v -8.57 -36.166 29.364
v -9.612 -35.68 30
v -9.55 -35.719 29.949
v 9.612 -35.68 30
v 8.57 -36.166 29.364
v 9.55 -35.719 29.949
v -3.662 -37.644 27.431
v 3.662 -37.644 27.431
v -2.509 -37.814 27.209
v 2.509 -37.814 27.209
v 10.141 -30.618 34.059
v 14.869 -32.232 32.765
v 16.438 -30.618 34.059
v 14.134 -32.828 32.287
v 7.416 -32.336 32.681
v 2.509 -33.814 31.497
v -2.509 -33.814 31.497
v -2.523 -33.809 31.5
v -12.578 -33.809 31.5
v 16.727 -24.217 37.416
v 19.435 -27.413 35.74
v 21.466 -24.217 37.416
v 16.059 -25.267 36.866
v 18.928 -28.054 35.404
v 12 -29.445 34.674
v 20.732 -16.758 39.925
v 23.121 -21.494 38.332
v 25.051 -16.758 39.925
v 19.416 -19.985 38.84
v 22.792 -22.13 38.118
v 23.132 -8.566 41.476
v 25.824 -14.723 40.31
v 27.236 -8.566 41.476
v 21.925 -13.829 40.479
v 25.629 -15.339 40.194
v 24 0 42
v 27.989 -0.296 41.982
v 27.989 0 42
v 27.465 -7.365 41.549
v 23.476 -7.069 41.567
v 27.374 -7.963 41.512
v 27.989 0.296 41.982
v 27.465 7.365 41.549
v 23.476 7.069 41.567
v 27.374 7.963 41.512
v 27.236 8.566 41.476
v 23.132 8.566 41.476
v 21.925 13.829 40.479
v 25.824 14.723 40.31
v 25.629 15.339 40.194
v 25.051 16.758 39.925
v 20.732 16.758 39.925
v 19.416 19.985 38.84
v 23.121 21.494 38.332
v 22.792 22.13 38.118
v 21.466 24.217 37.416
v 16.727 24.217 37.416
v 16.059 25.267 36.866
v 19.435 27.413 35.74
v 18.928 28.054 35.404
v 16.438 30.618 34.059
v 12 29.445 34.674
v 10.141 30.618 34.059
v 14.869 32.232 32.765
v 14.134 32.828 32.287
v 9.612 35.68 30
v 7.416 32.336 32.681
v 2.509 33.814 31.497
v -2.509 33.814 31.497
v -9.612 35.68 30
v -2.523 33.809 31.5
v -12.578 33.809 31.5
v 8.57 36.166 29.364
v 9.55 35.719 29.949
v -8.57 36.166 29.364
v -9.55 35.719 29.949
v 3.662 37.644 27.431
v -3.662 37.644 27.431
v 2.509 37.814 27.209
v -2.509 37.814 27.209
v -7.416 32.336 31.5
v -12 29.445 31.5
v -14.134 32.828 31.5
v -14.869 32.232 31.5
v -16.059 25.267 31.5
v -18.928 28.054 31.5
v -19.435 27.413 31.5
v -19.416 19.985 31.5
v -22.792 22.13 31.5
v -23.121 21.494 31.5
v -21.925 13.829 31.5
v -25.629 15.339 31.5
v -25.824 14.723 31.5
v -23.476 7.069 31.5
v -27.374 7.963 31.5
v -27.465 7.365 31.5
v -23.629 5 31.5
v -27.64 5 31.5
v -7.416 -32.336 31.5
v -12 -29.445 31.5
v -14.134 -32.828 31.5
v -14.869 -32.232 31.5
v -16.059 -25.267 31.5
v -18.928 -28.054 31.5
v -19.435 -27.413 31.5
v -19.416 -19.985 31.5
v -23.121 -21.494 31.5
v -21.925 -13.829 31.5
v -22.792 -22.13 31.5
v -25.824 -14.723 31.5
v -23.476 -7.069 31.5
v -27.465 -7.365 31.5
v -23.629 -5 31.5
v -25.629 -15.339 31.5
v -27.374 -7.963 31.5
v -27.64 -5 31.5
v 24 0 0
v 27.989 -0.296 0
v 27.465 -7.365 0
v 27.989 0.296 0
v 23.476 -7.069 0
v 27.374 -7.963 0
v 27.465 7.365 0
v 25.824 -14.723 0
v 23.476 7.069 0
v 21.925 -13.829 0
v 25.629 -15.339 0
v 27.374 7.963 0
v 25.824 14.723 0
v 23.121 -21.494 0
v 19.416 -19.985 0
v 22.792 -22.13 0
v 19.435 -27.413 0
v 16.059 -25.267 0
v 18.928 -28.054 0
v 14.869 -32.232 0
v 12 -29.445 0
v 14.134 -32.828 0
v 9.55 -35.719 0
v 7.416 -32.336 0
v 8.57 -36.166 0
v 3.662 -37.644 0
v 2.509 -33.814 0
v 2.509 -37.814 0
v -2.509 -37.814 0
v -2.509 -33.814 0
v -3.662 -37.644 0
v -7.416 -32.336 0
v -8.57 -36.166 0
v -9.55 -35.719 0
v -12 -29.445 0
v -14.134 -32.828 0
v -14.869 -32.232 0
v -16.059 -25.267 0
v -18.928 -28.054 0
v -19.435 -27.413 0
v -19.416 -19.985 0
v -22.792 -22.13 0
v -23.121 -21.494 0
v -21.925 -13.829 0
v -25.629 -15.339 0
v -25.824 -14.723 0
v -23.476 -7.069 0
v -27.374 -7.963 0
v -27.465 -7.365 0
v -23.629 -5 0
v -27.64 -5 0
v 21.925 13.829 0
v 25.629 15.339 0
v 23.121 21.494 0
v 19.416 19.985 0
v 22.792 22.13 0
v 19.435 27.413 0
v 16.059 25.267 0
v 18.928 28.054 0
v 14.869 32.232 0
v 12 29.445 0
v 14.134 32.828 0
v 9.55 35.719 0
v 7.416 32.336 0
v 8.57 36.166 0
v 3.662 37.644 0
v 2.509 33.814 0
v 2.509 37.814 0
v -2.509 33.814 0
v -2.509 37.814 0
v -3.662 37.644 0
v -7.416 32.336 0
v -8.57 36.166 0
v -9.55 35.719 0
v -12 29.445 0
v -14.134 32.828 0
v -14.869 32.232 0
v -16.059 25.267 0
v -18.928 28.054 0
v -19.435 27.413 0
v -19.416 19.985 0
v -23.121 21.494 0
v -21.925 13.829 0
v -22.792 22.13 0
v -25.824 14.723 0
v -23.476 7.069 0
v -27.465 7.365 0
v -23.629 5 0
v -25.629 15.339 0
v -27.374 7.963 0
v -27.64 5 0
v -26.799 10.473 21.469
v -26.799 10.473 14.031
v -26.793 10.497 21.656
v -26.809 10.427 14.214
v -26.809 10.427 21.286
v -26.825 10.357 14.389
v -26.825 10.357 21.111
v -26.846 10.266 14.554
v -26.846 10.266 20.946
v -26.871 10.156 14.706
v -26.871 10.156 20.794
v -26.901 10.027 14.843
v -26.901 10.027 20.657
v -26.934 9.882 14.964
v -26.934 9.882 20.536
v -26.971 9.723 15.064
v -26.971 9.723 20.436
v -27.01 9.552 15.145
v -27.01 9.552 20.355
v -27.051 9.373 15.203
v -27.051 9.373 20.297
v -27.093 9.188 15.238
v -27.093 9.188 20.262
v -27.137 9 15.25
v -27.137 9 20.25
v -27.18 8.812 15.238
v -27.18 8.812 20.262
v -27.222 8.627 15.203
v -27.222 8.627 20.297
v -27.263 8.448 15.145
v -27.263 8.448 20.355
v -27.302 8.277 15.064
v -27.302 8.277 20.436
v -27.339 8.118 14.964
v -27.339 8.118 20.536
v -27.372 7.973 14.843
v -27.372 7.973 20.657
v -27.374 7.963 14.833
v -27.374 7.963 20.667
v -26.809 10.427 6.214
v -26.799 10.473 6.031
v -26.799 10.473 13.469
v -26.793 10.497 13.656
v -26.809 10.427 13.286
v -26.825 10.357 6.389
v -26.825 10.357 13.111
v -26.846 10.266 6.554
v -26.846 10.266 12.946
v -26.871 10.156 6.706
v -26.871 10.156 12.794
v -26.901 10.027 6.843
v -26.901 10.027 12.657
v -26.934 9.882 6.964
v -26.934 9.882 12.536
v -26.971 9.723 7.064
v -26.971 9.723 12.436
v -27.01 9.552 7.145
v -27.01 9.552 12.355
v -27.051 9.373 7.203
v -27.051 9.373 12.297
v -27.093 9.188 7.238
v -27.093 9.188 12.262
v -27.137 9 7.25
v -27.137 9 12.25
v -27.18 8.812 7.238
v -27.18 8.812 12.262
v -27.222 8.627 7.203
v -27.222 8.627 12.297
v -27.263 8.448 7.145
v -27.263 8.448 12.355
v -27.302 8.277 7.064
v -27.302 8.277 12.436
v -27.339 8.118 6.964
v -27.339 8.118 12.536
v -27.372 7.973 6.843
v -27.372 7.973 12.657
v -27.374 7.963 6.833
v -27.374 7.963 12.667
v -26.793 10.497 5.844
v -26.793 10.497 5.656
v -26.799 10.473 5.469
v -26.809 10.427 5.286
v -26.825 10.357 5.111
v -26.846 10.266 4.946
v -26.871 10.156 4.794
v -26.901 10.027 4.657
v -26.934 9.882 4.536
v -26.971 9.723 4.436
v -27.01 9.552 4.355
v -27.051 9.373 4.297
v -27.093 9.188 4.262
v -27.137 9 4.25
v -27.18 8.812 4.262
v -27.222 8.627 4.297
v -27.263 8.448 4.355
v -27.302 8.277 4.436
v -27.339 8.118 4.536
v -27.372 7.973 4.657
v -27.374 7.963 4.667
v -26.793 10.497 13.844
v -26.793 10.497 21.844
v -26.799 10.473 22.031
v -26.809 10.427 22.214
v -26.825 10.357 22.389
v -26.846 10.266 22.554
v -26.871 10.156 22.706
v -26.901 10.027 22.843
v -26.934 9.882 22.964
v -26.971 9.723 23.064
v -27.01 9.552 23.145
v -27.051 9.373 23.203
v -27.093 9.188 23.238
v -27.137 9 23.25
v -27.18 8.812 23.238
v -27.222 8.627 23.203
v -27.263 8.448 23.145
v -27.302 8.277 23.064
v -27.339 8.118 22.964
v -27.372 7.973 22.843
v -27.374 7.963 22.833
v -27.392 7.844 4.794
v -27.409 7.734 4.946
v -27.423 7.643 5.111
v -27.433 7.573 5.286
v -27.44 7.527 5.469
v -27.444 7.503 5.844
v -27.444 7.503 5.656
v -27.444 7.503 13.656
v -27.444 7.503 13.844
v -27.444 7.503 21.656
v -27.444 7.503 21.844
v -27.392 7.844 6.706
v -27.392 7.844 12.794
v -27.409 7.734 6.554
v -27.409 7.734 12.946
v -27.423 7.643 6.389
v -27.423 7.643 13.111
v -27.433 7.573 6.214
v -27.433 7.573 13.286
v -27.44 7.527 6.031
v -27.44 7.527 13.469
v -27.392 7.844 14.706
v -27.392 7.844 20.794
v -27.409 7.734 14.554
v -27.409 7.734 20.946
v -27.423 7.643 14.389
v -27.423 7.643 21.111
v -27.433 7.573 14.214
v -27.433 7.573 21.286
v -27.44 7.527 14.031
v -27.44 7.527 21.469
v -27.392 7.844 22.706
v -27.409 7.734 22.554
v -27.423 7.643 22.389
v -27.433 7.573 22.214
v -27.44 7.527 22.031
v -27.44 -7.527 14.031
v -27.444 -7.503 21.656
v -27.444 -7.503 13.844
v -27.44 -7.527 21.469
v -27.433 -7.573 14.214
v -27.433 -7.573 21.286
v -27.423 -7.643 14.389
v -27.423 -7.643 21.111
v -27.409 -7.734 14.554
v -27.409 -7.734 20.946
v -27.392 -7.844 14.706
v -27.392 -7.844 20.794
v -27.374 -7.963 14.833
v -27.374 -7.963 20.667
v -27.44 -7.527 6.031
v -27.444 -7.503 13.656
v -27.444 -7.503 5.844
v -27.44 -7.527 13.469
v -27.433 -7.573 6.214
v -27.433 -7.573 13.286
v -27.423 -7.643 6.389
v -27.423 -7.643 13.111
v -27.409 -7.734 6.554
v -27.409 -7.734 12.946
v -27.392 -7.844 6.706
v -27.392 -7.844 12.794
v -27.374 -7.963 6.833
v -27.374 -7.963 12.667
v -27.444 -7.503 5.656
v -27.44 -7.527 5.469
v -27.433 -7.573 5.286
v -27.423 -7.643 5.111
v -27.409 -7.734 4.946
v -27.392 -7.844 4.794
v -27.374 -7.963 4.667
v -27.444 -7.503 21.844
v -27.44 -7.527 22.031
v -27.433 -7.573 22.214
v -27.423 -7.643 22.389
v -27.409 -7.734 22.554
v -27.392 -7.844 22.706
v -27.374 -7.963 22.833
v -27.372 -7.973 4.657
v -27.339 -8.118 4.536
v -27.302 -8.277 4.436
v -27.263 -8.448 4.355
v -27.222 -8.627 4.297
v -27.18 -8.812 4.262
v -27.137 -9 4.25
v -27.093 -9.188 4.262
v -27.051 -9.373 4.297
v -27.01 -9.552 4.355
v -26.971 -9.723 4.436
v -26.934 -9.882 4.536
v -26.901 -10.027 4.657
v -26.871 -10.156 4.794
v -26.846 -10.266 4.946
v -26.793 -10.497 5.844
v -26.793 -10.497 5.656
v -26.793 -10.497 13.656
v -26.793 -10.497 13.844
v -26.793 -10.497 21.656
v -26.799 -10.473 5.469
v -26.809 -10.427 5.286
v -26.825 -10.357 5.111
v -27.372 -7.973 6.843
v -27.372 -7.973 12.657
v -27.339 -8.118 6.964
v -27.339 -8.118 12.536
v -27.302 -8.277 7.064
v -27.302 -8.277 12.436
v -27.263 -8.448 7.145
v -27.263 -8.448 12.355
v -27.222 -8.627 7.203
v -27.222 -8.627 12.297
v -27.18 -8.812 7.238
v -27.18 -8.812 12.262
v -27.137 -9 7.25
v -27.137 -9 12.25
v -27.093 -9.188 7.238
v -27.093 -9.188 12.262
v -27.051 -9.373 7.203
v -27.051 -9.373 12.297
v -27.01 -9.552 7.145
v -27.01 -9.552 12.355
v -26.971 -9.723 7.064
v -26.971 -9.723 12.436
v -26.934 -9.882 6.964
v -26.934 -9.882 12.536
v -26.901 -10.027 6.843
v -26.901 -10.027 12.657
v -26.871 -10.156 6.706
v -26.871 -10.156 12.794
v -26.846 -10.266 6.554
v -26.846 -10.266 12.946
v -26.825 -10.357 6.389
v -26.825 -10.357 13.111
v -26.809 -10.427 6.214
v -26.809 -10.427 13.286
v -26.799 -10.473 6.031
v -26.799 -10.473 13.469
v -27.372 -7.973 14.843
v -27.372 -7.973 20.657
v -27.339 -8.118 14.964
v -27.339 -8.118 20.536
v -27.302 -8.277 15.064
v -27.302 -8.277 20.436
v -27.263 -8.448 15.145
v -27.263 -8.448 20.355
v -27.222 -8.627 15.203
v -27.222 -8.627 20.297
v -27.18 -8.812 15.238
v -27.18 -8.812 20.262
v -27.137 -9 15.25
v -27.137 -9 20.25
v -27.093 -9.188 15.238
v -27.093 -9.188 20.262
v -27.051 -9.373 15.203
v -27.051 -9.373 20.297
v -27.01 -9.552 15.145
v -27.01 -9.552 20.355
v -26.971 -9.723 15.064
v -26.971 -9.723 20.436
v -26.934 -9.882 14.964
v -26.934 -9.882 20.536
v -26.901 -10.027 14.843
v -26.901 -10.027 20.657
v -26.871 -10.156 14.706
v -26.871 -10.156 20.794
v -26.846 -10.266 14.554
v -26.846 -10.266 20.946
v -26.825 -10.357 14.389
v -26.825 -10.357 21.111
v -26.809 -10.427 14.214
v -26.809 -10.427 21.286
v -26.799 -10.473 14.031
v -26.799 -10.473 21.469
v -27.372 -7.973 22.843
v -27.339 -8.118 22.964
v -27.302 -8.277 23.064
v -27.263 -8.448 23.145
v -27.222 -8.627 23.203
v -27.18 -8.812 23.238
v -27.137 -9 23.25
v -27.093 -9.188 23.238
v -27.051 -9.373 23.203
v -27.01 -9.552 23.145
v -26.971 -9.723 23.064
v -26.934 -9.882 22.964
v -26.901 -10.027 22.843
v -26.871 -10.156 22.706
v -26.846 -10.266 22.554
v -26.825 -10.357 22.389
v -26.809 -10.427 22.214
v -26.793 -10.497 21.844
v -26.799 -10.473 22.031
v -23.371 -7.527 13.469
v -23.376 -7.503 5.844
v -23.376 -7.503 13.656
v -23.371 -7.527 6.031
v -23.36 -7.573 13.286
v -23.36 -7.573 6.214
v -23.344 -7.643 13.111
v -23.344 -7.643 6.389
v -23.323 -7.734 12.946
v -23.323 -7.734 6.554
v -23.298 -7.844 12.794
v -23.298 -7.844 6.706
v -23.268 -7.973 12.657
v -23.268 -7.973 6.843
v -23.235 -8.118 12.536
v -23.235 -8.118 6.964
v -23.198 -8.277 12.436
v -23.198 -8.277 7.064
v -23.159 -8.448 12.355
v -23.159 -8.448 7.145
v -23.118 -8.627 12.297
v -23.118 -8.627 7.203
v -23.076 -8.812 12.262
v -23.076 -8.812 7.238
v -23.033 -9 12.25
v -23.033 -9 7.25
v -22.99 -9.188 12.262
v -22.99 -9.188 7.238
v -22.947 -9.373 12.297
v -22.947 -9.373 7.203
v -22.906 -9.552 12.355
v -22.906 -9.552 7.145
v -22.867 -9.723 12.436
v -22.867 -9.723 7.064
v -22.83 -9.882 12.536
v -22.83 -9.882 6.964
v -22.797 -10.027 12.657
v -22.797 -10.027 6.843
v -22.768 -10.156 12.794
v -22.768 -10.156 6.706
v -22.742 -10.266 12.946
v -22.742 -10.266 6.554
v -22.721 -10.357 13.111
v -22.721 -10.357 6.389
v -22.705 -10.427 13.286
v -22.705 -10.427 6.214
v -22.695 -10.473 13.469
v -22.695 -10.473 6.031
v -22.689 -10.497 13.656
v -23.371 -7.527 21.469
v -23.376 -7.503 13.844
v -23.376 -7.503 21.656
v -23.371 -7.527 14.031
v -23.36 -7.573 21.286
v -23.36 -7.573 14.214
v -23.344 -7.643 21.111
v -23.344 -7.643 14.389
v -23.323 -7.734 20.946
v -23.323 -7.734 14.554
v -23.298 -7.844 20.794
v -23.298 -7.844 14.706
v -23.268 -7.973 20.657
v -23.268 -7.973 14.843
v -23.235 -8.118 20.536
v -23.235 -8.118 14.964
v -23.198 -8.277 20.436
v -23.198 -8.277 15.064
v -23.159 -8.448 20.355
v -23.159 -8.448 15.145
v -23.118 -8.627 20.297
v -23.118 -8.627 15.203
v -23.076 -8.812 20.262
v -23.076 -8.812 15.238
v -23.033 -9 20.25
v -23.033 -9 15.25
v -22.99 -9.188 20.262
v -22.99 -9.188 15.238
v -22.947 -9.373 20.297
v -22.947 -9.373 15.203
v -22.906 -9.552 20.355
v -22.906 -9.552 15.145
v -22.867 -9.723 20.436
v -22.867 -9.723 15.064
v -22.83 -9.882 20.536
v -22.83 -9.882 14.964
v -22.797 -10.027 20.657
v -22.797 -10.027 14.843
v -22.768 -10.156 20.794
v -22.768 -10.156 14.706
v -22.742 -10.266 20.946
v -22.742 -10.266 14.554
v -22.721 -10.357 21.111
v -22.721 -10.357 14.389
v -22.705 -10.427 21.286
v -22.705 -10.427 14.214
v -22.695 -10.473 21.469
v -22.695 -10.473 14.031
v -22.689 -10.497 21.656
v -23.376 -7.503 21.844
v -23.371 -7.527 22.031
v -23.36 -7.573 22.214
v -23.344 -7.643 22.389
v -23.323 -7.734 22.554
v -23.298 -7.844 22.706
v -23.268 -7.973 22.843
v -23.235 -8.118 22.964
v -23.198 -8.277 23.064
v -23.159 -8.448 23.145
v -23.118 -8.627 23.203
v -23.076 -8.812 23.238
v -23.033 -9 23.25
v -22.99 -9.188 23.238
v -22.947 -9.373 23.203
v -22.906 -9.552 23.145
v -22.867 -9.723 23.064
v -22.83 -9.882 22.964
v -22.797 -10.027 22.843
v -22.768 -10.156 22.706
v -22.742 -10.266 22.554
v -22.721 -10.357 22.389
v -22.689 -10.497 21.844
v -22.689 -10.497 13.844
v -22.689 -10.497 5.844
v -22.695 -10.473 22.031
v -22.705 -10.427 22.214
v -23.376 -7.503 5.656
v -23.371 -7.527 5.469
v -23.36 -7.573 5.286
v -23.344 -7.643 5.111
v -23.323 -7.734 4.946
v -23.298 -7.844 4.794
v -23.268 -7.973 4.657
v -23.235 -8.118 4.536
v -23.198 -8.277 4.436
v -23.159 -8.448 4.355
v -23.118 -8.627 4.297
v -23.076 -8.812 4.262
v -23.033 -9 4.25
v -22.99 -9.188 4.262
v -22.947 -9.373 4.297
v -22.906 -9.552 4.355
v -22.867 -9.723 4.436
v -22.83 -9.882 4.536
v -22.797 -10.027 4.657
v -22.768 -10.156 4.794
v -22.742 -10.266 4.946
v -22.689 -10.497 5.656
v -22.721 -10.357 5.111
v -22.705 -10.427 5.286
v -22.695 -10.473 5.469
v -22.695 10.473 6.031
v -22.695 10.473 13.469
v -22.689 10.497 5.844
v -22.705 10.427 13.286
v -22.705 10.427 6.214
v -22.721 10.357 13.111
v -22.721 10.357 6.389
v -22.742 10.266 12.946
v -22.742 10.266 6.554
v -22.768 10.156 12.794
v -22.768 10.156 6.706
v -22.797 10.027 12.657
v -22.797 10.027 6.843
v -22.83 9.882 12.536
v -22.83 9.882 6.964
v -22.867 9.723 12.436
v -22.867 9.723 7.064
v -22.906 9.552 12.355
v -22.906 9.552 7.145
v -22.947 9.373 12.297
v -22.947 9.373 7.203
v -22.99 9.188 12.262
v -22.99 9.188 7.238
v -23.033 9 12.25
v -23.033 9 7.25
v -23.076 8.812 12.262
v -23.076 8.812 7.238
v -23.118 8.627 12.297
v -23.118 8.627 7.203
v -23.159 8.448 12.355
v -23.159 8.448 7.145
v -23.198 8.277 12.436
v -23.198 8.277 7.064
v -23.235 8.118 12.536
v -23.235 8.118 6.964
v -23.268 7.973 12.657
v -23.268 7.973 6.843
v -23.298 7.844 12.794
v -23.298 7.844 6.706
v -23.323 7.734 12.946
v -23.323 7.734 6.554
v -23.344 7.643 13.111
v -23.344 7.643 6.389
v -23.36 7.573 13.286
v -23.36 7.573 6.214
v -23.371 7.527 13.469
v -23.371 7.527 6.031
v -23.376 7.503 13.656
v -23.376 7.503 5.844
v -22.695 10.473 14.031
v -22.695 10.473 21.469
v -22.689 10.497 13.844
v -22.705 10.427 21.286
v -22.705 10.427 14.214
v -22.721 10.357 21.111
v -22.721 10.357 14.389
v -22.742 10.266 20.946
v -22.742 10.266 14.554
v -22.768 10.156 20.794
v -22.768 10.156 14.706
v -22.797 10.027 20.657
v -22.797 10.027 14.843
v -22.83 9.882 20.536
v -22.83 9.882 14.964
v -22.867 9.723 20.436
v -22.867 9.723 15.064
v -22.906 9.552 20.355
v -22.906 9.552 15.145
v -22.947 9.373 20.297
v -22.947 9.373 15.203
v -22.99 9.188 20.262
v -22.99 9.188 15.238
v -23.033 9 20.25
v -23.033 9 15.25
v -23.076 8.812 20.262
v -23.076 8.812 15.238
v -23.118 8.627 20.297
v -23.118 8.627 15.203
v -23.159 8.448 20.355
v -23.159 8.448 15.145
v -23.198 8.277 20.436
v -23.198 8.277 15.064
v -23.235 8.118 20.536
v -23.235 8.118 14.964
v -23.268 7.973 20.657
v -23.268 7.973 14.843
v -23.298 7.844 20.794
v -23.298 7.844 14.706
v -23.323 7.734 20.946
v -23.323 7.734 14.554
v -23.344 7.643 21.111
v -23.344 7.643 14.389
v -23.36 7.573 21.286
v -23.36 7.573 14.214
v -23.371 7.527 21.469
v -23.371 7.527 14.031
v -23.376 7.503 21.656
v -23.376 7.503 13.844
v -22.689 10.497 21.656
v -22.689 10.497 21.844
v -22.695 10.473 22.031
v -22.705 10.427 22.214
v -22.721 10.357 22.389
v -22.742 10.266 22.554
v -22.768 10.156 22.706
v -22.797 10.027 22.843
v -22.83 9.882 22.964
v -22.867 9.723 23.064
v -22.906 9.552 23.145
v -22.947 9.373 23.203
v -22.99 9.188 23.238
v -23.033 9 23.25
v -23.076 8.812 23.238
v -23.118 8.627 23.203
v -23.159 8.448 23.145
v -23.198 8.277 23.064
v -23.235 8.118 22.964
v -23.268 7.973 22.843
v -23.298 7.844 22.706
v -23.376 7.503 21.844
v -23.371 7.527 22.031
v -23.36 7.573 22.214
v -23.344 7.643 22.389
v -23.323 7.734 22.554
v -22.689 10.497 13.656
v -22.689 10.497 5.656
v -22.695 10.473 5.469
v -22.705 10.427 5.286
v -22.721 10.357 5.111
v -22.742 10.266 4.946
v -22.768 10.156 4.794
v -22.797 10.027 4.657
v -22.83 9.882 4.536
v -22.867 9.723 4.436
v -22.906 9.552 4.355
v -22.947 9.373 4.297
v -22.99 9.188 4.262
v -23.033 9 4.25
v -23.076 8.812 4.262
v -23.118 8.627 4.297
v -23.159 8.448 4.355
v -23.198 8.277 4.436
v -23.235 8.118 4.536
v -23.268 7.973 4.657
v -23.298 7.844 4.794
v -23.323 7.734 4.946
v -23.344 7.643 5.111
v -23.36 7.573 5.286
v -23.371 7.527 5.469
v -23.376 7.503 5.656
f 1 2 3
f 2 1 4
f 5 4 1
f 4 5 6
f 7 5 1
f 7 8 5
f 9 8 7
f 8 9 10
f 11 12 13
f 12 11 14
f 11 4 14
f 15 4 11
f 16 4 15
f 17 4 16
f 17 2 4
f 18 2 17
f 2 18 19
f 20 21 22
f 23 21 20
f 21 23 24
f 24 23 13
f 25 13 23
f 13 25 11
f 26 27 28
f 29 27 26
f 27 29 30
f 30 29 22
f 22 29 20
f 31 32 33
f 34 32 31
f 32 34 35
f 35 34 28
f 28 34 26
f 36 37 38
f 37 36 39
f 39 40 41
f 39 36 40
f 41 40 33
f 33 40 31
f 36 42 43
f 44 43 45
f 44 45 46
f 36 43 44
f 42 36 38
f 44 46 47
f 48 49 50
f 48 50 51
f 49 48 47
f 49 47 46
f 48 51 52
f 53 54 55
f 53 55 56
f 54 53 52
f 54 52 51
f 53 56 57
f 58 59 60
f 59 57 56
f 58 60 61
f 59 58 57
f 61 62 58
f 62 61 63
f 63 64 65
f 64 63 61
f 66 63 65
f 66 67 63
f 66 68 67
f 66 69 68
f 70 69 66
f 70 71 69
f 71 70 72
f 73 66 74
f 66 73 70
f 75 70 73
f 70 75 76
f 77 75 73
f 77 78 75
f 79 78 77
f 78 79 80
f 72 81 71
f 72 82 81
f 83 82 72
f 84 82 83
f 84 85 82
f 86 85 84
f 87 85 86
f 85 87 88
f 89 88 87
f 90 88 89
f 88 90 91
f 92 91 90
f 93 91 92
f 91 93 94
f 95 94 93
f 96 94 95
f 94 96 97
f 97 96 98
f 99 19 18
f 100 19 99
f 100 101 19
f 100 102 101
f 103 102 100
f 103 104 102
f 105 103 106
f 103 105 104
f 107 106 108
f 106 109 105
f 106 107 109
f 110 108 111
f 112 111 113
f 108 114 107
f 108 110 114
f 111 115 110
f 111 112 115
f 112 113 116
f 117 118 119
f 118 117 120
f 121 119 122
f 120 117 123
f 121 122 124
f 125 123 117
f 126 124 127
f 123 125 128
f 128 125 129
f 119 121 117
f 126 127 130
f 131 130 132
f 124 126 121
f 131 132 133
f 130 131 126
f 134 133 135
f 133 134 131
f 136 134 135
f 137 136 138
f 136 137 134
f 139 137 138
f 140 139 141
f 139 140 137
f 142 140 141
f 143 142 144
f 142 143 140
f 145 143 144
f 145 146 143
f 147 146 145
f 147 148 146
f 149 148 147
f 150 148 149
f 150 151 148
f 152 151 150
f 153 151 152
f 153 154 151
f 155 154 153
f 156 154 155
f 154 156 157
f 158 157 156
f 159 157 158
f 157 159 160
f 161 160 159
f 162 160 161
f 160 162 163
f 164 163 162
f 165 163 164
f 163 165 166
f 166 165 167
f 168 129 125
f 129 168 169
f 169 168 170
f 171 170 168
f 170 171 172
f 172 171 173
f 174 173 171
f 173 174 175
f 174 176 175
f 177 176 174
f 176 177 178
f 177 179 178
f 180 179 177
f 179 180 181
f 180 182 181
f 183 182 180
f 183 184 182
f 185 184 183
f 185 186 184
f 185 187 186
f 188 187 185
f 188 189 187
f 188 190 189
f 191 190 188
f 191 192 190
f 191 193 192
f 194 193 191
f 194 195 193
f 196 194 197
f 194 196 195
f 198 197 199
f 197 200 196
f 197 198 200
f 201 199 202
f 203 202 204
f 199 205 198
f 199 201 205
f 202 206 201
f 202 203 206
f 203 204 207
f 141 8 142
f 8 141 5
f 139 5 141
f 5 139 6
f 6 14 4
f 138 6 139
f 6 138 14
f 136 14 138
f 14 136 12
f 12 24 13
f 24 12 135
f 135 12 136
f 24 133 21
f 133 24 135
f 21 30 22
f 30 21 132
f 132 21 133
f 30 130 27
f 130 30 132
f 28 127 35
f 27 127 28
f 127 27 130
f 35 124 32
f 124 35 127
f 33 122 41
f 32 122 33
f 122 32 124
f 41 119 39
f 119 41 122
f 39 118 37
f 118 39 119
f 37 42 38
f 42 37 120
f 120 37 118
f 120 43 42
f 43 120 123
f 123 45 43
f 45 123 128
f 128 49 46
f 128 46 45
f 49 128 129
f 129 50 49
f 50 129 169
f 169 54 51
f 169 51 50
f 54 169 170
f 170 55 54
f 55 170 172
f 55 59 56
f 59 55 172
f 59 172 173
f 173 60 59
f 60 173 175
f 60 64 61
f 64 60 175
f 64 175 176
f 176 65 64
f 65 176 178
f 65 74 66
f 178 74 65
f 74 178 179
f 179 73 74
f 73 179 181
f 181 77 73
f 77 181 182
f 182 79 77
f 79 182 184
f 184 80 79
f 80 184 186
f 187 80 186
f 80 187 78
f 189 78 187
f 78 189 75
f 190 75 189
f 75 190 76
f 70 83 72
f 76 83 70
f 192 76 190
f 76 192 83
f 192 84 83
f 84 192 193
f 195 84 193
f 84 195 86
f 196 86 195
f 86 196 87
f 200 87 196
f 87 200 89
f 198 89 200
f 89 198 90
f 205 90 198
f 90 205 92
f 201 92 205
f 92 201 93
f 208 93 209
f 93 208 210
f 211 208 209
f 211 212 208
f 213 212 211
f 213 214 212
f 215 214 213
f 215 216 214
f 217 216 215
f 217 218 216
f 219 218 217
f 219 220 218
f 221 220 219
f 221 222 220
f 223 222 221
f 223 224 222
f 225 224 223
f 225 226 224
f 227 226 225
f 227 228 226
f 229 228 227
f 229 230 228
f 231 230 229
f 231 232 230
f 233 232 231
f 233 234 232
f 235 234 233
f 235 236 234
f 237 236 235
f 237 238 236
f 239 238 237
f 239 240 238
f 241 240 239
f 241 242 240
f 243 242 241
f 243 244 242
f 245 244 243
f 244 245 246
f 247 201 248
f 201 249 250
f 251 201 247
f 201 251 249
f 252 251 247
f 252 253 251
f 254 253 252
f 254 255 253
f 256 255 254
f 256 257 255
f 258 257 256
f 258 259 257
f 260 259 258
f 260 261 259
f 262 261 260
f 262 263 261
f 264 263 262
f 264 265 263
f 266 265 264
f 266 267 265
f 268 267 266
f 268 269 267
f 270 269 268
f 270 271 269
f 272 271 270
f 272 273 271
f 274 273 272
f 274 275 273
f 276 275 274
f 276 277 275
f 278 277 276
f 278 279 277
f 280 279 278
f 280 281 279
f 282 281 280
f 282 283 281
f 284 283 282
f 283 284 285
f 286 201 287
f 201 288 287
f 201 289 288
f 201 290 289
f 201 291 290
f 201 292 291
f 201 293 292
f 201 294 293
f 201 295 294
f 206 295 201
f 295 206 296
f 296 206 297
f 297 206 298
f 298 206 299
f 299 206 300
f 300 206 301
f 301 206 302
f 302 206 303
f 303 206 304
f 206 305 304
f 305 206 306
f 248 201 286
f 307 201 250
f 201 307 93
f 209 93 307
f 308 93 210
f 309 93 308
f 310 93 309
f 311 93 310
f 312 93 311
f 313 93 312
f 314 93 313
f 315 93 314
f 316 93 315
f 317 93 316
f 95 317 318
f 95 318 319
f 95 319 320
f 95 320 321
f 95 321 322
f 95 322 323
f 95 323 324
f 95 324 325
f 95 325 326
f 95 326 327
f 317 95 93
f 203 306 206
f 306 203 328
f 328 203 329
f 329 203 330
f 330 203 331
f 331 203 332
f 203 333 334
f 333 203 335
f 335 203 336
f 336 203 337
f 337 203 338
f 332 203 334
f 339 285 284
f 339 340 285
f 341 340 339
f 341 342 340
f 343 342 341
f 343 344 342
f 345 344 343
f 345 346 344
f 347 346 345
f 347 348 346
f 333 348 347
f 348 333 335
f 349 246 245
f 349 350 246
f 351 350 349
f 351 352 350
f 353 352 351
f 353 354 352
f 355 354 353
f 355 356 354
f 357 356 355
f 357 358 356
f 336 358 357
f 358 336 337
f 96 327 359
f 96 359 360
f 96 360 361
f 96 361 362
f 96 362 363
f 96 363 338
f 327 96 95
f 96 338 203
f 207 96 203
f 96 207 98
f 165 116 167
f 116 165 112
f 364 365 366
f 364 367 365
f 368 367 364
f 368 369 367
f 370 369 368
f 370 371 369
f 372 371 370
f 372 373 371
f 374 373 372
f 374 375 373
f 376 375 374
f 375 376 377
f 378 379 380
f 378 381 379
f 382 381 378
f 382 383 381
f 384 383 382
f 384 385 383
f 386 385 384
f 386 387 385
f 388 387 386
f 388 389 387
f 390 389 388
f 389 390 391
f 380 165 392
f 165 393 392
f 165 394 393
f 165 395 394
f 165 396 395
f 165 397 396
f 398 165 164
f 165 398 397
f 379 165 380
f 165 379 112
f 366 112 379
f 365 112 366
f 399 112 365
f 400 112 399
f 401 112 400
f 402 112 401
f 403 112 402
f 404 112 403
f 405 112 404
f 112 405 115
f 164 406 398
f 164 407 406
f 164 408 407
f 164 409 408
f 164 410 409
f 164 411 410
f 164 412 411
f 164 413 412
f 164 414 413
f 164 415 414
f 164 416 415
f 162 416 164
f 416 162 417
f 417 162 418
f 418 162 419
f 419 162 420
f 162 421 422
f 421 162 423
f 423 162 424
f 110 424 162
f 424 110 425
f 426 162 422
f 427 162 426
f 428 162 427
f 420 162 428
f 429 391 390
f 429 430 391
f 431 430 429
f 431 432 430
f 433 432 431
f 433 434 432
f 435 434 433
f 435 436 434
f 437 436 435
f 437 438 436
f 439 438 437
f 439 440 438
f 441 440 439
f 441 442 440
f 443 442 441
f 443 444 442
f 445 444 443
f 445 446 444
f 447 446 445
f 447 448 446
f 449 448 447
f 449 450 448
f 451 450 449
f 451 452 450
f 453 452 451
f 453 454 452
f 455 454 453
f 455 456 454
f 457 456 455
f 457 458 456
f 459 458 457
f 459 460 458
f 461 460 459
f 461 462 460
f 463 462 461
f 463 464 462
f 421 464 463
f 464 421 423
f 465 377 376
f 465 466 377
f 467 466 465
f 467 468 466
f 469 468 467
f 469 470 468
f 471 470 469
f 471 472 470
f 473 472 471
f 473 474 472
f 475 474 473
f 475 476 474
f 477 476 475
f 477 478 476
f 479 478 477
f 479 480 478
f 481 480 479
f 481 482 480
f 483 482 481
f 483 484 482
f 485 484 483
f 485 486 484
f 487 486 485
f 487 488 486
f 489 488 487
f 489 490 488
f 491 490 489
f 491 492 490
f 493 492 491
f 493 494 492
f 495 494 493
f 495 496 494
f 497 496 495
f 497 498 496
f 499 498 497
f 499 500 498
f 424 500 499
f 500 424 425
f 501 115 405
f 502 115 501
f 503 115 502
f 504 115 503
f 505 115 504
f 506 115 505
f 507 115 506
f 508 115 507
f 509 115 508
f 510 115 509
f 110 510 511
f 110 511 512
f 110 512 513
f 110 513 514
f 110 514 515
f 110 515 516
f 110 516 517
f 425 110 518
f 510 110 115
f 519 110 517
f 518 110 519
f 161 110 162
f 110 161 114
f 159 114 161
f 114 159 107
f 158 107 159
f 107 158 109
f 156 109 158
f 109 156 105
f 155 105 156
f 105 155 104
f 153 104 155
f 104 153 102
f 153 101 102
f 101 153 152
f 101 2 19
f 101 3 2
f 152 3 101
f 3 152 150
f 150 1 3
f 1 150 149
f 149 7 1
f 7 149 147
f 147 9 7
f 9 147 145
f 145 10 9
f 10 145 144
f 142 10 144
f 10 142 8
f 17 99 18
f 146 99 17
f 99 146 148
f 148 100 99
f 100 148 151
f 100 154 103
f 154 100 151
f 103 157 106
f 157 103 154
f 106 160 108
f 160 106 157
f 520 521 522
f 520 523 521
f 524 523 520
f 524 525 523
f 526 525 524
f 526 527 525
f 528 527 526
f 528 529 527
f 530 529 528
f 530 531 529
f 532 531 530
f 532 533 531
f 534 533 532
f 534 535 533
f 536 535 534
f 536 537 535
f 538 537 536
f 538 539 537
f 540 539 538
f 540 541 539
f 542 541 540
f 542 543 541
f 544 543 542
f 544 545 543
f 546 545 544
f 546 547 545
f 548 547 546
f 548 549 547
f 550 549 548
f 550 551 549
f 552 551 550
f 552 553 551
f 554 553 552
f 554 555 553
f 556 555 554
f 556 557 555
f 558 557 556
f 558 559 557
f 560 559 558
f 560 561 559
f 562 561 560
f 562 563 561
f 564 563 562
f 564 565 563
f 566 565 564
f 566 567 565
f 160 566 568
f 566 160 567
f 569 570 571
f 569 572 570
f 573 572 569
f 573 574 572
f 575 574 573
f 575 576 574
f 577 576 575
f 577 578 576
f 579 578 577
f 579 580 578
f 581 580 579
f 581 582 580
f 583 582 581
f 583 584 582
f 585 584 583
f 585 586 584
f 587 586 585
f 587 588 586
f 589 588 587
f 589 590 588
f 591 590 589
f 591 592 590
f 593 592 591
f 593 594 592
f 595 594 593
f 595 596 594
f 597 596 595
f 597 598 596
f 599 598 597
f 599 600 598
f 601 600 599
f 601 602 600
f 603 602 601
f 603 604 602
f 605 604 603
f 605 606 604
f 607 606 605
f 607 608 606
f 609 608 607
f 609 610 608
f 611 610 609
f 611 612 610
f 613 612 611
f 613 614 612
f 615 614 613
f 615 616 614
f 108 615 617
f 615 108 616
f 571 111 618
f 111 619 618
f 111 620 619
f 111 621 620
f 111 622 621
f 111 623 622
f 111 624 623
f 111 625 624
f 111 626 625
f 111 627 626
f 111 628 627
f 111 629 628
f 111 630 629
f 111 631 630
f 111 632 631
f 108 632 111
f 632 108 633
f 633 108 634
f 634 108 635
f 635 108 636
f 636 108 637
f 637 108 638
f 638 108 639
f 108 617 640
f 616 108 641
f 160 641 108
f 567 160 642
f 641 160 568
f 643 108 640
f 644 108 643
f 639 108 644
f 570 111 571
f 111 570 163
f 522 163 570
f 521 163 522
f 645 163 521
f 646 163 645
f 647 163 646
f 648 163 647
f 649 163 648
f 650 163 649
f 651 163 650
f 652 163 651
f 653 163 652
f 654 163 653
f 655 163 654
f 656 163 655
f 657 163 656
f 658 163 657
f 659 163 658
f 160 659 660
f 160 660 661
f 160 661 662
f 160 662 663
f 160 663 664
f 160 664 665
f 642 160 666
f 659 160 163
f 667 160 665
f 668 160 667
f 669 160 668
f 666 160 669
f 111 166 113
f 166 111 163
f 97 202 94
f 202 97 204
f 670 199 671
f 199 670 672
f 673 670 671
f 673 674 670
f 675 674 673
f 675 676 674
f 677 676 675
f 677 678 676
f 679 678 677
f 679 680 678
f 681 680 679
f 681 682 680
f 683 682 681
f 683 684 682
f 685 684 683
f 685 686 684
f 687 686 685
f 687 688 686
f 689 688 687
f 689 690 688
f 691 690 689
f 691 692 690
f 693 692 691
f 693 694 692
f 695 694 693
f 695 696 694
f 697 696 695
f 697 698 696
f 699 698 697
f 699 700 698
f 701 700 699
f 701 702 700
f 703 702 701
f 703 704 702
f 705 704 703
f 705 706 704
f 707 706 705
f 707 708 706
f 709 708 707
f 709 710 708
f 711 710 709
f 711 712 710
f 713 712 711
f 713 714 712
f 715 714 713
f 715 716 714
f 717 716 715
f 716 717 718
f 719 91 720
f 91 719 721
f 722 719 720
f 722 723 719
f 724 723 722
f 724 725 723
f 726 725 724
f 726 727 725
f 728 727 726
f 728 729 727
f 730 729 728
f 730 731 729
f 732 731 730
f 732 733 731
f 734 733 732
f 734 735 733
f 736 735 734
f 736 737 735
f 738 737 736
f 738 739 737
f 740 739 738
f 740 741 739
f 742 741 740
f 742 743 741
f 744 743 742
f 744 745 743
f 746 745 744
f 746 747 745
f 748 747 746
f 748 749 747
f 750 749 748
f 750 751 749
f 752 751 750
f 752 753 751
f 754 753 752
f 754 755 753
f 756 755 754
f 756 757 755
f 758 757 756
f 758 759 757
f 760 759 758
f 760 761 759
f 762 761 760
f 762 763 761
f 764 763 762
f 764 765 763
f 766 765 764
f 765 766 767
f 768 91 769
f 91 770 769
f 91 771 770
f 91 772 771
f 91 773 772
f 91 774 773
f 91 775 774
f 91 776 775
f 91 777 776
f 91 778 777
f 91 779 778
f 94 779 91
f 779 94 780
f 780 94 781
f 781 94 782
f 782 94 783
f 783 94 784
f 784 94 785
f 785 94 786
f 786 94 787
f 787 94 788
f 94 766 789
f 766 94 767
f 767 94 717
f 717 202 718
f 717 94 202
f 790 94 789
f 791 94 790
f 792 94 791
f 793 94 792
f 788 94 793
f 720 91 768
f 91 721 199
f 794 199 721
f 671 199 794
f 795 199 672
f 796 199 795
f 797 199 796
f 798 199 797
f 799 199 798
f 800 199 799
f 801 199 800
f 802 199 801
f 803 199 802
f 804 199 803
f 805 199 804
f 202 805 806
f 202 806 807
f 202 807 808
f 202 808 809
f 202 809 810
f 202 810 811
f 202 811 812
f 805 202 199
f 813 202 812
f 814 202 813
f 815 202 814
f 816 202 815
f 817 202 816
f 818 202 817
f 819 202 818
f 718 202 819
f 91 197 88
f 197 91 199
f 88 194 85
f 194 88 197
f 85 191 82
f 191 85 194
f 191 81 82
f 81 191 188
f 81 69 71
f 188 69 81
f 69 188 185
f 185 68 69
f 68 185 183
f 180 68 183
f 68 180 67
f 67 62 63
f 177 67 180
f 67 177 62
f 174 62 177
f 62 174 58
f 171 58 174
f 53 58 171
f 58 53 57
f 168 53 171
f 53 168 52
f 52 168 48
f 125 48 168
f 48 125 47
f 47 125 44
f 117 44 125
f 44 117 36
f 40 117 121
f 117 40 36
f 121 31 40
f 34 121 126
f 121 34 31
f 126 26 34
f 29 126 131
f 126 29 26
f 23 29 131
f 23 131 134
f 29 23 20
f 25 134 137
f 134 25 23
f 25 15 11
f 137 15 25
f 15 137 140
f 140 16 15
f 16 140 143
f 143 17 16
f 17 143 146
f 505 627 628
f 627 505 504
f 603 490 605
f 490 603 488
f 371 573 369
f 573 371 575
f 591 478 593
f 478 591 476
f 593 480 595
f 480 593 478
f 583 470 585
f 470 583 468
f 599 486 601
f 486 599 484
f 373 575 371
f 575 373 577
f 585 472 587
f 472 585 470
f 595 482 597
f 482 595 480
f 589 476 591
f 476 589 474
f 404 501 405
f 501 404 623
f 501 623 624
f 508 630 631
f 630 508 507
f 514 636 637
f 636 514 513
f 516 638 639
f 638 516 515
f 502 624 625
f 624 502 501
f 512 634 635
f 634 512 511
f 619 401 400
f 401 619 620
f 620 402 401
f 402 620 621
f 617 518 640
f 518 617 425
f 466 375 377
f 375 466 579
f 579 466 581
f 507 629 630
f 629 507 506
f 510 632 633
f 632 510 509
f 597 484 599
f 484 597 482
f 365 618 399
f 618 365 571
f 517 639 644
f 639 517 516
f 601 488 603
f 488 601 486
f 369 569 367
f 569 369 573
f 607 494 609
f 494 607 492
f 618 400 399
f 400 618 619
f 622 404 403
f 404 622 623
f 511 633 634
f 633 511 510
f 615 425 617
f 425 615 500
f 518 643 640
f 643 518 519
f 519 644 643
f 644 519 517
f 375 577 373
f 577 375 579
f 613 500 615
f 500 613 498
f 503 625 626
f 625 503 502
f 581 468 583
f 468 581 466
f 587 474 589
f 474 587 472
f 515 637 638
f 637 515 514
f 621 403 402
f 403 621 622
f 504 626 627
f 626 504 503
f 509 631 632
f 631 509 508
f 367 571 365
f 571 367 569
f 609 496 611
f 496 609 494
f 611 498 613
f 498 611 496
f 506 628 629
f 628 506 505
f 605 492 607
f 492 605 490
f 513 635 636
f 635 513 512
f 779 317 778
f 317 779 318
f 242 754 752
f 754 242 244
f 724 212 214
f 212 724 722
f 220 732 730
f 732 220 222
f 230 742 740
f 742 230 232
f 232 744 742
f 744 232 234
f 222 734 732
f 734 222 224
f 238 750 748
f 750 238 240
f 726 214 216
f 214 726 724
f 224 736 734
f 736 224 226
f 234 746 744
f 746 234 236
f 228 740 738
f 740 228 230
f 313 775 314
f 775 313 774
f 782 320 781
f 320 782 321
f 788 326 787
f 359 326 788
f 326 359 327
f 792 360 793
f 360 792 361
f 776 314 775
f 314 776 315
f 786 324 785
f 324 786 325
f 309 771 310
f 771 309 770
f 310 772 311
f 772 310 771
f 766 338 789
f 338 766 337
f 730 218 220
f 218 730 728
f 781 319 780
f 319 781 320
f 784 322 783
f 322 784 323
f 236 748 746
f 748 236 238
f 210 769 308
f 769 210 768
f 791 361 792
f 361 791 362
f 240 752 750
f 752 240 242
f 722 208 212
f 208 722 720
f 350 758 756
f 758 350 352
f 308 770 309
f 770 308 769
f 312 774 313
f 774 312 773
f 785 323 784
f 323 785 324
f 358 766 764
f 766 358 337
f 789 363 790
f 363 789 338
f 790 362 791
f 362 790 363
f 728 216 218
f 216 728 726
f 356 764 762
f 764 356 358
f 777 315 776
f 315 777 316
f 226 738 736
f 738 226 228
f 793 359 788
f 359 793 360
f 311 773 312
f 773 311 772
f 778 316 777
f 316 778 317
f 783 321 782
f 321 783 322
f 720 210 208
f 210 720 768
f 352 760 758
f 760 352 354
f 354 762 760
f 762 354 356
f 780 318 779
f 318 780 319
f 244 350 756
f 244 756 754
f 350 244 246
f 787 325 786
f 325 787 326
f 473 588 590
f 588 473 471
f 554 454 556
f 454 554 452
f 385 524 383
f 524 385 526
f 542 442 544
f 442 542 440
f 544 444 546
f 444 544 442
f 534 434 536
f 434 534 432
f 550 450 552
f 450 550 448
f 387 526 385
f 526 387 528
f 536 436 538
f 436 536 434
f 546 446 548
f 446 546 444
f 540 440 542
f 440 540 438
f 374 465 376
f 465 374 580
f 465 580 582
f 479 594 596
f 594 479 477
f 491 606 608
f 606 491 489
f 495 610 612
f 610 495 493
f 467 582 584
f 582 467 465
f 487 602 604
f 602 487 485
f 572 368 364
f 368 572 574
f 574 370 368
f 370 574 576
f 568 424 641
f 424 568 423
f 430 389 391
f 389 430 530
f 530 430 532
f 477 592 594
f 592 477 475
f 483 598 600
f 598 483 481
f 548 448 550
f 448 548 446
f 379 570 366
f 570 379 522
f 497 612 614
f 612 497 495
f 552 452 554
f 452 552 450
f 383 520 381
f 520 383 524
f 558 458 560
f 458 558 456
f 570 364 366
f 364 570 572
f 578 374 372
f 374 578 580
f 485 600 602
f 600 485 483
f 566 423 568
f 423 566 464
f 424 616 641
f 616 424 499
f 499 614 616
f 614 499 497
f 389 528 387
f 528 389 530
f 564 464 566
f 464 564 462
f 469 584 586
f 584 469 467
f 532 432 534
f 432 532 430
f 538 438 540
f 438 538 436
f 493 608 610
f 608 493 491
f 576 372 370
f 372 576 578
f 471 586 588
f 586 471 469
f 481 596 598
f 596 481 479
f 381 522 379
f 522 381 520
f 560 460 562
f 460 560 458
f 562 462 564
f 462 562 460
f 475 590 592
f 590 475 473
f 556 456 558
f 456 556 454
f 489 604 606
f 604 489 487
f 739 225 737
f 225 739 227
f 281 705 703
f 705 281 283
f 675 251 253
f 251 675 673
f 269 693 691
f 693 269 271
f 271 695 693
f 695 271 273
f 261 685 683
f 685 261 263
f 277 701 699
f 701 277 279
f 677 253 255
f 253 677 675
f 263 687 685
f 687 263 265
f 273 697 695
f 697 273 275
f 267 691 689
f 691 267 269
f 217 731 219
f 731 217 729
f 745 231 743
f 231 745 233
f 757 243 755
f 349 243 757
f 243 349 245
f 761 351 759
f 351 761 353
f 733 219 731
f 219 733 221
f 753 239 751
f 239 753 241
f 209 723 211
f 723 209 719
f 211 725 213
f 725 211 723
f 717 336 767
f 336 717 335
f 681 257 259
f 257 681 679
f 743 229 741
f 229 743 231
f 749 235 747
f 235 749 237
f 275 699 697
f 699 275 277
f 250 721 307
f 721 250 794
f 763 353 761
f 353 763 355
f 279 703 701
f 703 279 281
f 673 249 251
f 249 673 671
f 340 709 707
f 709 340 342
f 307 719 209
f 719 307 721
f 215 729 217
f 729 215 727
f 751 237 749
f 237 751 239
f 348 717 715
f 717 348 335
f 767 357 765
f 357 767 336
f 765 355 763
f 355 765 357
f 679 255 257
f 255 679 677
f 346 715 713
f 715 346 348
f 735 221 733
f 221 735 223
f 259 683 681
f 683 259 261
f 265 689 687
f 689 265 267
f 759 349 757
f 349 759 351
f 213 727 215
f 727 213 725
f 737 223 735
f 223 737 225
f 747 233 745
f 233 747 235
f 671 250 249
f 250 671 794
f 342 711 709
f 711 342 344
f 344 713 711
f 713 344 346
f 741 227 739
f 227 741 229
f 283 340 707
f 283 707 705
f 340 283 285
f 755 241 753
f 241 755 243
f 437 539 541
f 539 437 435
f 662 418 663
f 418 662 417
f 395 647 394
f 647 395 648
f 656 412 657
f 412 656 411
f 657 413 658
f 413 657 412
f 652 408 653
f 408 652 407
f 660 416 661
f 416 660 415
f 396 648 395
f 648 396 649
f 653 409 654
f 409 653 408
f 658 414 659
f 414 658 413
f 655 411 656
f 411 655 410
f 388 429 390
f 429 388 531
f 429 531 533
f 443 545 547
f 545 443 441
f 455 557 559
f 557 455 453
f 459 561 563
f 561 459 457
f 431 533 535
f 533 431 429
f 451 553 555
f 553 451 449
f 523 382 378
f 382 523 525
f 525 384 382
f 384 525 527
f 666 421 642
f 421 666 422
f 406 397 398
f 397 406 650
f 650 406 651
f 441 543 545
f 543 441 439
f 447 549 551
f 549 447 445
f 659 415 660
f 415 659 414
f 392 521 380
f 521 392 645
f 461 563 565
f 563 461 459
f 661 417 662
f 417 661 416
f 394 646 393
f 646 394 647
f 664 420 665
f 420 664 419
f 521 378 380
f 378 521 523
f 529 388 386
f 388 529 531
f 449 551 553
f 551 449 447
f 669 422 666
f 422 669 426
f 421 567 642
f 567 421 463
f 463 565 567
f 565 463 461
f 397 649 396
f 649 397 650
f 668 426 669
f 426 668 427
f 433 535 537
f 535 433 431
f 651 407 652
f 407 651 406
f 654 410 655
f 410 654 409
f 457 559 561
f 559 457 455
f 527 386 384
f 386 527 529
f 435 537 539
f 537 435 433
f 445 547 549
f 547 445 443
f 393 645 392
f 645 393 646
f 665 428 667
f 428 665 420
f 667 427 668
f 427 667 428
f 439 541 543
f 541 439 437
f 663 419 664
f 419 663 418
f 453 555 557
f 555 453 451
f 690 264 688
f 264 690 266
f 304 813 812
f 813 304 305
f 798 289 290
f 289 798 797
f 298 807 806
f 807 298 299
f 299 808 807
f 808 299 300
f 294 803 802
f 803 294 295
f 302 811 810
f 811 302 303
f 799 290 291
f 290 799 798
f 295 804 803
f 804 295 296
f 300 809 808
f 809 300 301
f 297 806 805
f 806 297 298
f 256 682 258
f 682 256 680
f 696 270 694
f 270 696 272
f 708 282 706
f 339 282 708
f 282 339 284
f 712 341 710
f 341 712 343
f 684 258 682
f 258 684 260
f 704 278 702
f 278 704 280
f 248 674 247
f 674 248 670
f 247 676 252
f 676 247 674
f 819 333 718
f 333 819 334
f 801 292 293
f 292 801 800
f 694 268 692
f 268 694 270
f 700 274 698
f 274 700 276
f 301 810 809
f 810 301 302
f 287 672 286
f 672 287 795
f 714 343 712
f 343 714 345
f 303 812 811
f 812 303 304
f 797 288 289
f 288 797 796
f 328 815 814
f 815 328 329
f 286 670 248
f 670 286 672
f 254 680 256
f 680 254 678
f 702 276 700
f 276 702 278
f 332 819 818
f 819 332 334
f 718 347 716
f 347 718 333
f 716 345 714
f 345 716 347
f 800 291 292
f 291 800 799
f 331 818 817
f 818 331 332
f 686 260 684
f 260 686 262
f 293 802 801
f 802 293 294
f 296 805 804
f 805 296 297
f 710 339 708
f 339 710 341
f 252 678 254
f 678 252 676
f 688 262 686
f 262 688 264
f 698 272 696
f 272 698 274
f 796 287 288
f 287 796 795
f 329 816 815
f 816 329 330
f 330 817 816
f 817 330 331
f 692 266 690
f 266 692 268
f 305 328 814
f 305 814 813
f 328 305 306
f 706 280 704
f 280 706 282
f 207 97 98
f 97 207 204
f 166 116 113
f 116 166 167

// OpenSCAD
module wrist(majD, minD, wd, t) {
    intersection(){
        linear_extrude(wd+5)
        difference(){
            offset(r=t)
            scale([1,majD/minD])
            circle(d=minD);
            scale([1,majD/minD])
            circle(d=minD);
        }
        difference(){
            translate([minD,0,wd-minD/2+5])
            rotate([0,-90,0])
            linear_extrude(2*minD)
            union() {
                scale([1,.3+majD/minD])
                circle(d=minD);
                translate([-wd/2,0,0])
                scale([1,1+majD/minD])
                square([wd,minD], center=true);
            }
            translate([-(majD+10)/2, 0,((majD+10)/2+wd/2+13)])
            cube(majD+10, center=true);
        }
    }
}

module lacingMask(d, ht,t) {
    
    translate([-d/2,0,ht/2])
    cube([10,10, 2*ht],center=true);
    for(i=[1:3]) {
        translate([-d/2-5, -9,(3*ht+2*t)/4-i*8])
        rotate([0,90,0])
        cylinder(h=10, d=3, $fn=50);
        translate([-d/2-5, 9,(3*ht+2*t)/4-i*8])
        rotate([0,90,0])
        cylinder(h=10, d=3, $fn=50);
    }
}
difference(){
wrist(68, 48, 37, 4);
lacingMask(48, 37, 4);
}
